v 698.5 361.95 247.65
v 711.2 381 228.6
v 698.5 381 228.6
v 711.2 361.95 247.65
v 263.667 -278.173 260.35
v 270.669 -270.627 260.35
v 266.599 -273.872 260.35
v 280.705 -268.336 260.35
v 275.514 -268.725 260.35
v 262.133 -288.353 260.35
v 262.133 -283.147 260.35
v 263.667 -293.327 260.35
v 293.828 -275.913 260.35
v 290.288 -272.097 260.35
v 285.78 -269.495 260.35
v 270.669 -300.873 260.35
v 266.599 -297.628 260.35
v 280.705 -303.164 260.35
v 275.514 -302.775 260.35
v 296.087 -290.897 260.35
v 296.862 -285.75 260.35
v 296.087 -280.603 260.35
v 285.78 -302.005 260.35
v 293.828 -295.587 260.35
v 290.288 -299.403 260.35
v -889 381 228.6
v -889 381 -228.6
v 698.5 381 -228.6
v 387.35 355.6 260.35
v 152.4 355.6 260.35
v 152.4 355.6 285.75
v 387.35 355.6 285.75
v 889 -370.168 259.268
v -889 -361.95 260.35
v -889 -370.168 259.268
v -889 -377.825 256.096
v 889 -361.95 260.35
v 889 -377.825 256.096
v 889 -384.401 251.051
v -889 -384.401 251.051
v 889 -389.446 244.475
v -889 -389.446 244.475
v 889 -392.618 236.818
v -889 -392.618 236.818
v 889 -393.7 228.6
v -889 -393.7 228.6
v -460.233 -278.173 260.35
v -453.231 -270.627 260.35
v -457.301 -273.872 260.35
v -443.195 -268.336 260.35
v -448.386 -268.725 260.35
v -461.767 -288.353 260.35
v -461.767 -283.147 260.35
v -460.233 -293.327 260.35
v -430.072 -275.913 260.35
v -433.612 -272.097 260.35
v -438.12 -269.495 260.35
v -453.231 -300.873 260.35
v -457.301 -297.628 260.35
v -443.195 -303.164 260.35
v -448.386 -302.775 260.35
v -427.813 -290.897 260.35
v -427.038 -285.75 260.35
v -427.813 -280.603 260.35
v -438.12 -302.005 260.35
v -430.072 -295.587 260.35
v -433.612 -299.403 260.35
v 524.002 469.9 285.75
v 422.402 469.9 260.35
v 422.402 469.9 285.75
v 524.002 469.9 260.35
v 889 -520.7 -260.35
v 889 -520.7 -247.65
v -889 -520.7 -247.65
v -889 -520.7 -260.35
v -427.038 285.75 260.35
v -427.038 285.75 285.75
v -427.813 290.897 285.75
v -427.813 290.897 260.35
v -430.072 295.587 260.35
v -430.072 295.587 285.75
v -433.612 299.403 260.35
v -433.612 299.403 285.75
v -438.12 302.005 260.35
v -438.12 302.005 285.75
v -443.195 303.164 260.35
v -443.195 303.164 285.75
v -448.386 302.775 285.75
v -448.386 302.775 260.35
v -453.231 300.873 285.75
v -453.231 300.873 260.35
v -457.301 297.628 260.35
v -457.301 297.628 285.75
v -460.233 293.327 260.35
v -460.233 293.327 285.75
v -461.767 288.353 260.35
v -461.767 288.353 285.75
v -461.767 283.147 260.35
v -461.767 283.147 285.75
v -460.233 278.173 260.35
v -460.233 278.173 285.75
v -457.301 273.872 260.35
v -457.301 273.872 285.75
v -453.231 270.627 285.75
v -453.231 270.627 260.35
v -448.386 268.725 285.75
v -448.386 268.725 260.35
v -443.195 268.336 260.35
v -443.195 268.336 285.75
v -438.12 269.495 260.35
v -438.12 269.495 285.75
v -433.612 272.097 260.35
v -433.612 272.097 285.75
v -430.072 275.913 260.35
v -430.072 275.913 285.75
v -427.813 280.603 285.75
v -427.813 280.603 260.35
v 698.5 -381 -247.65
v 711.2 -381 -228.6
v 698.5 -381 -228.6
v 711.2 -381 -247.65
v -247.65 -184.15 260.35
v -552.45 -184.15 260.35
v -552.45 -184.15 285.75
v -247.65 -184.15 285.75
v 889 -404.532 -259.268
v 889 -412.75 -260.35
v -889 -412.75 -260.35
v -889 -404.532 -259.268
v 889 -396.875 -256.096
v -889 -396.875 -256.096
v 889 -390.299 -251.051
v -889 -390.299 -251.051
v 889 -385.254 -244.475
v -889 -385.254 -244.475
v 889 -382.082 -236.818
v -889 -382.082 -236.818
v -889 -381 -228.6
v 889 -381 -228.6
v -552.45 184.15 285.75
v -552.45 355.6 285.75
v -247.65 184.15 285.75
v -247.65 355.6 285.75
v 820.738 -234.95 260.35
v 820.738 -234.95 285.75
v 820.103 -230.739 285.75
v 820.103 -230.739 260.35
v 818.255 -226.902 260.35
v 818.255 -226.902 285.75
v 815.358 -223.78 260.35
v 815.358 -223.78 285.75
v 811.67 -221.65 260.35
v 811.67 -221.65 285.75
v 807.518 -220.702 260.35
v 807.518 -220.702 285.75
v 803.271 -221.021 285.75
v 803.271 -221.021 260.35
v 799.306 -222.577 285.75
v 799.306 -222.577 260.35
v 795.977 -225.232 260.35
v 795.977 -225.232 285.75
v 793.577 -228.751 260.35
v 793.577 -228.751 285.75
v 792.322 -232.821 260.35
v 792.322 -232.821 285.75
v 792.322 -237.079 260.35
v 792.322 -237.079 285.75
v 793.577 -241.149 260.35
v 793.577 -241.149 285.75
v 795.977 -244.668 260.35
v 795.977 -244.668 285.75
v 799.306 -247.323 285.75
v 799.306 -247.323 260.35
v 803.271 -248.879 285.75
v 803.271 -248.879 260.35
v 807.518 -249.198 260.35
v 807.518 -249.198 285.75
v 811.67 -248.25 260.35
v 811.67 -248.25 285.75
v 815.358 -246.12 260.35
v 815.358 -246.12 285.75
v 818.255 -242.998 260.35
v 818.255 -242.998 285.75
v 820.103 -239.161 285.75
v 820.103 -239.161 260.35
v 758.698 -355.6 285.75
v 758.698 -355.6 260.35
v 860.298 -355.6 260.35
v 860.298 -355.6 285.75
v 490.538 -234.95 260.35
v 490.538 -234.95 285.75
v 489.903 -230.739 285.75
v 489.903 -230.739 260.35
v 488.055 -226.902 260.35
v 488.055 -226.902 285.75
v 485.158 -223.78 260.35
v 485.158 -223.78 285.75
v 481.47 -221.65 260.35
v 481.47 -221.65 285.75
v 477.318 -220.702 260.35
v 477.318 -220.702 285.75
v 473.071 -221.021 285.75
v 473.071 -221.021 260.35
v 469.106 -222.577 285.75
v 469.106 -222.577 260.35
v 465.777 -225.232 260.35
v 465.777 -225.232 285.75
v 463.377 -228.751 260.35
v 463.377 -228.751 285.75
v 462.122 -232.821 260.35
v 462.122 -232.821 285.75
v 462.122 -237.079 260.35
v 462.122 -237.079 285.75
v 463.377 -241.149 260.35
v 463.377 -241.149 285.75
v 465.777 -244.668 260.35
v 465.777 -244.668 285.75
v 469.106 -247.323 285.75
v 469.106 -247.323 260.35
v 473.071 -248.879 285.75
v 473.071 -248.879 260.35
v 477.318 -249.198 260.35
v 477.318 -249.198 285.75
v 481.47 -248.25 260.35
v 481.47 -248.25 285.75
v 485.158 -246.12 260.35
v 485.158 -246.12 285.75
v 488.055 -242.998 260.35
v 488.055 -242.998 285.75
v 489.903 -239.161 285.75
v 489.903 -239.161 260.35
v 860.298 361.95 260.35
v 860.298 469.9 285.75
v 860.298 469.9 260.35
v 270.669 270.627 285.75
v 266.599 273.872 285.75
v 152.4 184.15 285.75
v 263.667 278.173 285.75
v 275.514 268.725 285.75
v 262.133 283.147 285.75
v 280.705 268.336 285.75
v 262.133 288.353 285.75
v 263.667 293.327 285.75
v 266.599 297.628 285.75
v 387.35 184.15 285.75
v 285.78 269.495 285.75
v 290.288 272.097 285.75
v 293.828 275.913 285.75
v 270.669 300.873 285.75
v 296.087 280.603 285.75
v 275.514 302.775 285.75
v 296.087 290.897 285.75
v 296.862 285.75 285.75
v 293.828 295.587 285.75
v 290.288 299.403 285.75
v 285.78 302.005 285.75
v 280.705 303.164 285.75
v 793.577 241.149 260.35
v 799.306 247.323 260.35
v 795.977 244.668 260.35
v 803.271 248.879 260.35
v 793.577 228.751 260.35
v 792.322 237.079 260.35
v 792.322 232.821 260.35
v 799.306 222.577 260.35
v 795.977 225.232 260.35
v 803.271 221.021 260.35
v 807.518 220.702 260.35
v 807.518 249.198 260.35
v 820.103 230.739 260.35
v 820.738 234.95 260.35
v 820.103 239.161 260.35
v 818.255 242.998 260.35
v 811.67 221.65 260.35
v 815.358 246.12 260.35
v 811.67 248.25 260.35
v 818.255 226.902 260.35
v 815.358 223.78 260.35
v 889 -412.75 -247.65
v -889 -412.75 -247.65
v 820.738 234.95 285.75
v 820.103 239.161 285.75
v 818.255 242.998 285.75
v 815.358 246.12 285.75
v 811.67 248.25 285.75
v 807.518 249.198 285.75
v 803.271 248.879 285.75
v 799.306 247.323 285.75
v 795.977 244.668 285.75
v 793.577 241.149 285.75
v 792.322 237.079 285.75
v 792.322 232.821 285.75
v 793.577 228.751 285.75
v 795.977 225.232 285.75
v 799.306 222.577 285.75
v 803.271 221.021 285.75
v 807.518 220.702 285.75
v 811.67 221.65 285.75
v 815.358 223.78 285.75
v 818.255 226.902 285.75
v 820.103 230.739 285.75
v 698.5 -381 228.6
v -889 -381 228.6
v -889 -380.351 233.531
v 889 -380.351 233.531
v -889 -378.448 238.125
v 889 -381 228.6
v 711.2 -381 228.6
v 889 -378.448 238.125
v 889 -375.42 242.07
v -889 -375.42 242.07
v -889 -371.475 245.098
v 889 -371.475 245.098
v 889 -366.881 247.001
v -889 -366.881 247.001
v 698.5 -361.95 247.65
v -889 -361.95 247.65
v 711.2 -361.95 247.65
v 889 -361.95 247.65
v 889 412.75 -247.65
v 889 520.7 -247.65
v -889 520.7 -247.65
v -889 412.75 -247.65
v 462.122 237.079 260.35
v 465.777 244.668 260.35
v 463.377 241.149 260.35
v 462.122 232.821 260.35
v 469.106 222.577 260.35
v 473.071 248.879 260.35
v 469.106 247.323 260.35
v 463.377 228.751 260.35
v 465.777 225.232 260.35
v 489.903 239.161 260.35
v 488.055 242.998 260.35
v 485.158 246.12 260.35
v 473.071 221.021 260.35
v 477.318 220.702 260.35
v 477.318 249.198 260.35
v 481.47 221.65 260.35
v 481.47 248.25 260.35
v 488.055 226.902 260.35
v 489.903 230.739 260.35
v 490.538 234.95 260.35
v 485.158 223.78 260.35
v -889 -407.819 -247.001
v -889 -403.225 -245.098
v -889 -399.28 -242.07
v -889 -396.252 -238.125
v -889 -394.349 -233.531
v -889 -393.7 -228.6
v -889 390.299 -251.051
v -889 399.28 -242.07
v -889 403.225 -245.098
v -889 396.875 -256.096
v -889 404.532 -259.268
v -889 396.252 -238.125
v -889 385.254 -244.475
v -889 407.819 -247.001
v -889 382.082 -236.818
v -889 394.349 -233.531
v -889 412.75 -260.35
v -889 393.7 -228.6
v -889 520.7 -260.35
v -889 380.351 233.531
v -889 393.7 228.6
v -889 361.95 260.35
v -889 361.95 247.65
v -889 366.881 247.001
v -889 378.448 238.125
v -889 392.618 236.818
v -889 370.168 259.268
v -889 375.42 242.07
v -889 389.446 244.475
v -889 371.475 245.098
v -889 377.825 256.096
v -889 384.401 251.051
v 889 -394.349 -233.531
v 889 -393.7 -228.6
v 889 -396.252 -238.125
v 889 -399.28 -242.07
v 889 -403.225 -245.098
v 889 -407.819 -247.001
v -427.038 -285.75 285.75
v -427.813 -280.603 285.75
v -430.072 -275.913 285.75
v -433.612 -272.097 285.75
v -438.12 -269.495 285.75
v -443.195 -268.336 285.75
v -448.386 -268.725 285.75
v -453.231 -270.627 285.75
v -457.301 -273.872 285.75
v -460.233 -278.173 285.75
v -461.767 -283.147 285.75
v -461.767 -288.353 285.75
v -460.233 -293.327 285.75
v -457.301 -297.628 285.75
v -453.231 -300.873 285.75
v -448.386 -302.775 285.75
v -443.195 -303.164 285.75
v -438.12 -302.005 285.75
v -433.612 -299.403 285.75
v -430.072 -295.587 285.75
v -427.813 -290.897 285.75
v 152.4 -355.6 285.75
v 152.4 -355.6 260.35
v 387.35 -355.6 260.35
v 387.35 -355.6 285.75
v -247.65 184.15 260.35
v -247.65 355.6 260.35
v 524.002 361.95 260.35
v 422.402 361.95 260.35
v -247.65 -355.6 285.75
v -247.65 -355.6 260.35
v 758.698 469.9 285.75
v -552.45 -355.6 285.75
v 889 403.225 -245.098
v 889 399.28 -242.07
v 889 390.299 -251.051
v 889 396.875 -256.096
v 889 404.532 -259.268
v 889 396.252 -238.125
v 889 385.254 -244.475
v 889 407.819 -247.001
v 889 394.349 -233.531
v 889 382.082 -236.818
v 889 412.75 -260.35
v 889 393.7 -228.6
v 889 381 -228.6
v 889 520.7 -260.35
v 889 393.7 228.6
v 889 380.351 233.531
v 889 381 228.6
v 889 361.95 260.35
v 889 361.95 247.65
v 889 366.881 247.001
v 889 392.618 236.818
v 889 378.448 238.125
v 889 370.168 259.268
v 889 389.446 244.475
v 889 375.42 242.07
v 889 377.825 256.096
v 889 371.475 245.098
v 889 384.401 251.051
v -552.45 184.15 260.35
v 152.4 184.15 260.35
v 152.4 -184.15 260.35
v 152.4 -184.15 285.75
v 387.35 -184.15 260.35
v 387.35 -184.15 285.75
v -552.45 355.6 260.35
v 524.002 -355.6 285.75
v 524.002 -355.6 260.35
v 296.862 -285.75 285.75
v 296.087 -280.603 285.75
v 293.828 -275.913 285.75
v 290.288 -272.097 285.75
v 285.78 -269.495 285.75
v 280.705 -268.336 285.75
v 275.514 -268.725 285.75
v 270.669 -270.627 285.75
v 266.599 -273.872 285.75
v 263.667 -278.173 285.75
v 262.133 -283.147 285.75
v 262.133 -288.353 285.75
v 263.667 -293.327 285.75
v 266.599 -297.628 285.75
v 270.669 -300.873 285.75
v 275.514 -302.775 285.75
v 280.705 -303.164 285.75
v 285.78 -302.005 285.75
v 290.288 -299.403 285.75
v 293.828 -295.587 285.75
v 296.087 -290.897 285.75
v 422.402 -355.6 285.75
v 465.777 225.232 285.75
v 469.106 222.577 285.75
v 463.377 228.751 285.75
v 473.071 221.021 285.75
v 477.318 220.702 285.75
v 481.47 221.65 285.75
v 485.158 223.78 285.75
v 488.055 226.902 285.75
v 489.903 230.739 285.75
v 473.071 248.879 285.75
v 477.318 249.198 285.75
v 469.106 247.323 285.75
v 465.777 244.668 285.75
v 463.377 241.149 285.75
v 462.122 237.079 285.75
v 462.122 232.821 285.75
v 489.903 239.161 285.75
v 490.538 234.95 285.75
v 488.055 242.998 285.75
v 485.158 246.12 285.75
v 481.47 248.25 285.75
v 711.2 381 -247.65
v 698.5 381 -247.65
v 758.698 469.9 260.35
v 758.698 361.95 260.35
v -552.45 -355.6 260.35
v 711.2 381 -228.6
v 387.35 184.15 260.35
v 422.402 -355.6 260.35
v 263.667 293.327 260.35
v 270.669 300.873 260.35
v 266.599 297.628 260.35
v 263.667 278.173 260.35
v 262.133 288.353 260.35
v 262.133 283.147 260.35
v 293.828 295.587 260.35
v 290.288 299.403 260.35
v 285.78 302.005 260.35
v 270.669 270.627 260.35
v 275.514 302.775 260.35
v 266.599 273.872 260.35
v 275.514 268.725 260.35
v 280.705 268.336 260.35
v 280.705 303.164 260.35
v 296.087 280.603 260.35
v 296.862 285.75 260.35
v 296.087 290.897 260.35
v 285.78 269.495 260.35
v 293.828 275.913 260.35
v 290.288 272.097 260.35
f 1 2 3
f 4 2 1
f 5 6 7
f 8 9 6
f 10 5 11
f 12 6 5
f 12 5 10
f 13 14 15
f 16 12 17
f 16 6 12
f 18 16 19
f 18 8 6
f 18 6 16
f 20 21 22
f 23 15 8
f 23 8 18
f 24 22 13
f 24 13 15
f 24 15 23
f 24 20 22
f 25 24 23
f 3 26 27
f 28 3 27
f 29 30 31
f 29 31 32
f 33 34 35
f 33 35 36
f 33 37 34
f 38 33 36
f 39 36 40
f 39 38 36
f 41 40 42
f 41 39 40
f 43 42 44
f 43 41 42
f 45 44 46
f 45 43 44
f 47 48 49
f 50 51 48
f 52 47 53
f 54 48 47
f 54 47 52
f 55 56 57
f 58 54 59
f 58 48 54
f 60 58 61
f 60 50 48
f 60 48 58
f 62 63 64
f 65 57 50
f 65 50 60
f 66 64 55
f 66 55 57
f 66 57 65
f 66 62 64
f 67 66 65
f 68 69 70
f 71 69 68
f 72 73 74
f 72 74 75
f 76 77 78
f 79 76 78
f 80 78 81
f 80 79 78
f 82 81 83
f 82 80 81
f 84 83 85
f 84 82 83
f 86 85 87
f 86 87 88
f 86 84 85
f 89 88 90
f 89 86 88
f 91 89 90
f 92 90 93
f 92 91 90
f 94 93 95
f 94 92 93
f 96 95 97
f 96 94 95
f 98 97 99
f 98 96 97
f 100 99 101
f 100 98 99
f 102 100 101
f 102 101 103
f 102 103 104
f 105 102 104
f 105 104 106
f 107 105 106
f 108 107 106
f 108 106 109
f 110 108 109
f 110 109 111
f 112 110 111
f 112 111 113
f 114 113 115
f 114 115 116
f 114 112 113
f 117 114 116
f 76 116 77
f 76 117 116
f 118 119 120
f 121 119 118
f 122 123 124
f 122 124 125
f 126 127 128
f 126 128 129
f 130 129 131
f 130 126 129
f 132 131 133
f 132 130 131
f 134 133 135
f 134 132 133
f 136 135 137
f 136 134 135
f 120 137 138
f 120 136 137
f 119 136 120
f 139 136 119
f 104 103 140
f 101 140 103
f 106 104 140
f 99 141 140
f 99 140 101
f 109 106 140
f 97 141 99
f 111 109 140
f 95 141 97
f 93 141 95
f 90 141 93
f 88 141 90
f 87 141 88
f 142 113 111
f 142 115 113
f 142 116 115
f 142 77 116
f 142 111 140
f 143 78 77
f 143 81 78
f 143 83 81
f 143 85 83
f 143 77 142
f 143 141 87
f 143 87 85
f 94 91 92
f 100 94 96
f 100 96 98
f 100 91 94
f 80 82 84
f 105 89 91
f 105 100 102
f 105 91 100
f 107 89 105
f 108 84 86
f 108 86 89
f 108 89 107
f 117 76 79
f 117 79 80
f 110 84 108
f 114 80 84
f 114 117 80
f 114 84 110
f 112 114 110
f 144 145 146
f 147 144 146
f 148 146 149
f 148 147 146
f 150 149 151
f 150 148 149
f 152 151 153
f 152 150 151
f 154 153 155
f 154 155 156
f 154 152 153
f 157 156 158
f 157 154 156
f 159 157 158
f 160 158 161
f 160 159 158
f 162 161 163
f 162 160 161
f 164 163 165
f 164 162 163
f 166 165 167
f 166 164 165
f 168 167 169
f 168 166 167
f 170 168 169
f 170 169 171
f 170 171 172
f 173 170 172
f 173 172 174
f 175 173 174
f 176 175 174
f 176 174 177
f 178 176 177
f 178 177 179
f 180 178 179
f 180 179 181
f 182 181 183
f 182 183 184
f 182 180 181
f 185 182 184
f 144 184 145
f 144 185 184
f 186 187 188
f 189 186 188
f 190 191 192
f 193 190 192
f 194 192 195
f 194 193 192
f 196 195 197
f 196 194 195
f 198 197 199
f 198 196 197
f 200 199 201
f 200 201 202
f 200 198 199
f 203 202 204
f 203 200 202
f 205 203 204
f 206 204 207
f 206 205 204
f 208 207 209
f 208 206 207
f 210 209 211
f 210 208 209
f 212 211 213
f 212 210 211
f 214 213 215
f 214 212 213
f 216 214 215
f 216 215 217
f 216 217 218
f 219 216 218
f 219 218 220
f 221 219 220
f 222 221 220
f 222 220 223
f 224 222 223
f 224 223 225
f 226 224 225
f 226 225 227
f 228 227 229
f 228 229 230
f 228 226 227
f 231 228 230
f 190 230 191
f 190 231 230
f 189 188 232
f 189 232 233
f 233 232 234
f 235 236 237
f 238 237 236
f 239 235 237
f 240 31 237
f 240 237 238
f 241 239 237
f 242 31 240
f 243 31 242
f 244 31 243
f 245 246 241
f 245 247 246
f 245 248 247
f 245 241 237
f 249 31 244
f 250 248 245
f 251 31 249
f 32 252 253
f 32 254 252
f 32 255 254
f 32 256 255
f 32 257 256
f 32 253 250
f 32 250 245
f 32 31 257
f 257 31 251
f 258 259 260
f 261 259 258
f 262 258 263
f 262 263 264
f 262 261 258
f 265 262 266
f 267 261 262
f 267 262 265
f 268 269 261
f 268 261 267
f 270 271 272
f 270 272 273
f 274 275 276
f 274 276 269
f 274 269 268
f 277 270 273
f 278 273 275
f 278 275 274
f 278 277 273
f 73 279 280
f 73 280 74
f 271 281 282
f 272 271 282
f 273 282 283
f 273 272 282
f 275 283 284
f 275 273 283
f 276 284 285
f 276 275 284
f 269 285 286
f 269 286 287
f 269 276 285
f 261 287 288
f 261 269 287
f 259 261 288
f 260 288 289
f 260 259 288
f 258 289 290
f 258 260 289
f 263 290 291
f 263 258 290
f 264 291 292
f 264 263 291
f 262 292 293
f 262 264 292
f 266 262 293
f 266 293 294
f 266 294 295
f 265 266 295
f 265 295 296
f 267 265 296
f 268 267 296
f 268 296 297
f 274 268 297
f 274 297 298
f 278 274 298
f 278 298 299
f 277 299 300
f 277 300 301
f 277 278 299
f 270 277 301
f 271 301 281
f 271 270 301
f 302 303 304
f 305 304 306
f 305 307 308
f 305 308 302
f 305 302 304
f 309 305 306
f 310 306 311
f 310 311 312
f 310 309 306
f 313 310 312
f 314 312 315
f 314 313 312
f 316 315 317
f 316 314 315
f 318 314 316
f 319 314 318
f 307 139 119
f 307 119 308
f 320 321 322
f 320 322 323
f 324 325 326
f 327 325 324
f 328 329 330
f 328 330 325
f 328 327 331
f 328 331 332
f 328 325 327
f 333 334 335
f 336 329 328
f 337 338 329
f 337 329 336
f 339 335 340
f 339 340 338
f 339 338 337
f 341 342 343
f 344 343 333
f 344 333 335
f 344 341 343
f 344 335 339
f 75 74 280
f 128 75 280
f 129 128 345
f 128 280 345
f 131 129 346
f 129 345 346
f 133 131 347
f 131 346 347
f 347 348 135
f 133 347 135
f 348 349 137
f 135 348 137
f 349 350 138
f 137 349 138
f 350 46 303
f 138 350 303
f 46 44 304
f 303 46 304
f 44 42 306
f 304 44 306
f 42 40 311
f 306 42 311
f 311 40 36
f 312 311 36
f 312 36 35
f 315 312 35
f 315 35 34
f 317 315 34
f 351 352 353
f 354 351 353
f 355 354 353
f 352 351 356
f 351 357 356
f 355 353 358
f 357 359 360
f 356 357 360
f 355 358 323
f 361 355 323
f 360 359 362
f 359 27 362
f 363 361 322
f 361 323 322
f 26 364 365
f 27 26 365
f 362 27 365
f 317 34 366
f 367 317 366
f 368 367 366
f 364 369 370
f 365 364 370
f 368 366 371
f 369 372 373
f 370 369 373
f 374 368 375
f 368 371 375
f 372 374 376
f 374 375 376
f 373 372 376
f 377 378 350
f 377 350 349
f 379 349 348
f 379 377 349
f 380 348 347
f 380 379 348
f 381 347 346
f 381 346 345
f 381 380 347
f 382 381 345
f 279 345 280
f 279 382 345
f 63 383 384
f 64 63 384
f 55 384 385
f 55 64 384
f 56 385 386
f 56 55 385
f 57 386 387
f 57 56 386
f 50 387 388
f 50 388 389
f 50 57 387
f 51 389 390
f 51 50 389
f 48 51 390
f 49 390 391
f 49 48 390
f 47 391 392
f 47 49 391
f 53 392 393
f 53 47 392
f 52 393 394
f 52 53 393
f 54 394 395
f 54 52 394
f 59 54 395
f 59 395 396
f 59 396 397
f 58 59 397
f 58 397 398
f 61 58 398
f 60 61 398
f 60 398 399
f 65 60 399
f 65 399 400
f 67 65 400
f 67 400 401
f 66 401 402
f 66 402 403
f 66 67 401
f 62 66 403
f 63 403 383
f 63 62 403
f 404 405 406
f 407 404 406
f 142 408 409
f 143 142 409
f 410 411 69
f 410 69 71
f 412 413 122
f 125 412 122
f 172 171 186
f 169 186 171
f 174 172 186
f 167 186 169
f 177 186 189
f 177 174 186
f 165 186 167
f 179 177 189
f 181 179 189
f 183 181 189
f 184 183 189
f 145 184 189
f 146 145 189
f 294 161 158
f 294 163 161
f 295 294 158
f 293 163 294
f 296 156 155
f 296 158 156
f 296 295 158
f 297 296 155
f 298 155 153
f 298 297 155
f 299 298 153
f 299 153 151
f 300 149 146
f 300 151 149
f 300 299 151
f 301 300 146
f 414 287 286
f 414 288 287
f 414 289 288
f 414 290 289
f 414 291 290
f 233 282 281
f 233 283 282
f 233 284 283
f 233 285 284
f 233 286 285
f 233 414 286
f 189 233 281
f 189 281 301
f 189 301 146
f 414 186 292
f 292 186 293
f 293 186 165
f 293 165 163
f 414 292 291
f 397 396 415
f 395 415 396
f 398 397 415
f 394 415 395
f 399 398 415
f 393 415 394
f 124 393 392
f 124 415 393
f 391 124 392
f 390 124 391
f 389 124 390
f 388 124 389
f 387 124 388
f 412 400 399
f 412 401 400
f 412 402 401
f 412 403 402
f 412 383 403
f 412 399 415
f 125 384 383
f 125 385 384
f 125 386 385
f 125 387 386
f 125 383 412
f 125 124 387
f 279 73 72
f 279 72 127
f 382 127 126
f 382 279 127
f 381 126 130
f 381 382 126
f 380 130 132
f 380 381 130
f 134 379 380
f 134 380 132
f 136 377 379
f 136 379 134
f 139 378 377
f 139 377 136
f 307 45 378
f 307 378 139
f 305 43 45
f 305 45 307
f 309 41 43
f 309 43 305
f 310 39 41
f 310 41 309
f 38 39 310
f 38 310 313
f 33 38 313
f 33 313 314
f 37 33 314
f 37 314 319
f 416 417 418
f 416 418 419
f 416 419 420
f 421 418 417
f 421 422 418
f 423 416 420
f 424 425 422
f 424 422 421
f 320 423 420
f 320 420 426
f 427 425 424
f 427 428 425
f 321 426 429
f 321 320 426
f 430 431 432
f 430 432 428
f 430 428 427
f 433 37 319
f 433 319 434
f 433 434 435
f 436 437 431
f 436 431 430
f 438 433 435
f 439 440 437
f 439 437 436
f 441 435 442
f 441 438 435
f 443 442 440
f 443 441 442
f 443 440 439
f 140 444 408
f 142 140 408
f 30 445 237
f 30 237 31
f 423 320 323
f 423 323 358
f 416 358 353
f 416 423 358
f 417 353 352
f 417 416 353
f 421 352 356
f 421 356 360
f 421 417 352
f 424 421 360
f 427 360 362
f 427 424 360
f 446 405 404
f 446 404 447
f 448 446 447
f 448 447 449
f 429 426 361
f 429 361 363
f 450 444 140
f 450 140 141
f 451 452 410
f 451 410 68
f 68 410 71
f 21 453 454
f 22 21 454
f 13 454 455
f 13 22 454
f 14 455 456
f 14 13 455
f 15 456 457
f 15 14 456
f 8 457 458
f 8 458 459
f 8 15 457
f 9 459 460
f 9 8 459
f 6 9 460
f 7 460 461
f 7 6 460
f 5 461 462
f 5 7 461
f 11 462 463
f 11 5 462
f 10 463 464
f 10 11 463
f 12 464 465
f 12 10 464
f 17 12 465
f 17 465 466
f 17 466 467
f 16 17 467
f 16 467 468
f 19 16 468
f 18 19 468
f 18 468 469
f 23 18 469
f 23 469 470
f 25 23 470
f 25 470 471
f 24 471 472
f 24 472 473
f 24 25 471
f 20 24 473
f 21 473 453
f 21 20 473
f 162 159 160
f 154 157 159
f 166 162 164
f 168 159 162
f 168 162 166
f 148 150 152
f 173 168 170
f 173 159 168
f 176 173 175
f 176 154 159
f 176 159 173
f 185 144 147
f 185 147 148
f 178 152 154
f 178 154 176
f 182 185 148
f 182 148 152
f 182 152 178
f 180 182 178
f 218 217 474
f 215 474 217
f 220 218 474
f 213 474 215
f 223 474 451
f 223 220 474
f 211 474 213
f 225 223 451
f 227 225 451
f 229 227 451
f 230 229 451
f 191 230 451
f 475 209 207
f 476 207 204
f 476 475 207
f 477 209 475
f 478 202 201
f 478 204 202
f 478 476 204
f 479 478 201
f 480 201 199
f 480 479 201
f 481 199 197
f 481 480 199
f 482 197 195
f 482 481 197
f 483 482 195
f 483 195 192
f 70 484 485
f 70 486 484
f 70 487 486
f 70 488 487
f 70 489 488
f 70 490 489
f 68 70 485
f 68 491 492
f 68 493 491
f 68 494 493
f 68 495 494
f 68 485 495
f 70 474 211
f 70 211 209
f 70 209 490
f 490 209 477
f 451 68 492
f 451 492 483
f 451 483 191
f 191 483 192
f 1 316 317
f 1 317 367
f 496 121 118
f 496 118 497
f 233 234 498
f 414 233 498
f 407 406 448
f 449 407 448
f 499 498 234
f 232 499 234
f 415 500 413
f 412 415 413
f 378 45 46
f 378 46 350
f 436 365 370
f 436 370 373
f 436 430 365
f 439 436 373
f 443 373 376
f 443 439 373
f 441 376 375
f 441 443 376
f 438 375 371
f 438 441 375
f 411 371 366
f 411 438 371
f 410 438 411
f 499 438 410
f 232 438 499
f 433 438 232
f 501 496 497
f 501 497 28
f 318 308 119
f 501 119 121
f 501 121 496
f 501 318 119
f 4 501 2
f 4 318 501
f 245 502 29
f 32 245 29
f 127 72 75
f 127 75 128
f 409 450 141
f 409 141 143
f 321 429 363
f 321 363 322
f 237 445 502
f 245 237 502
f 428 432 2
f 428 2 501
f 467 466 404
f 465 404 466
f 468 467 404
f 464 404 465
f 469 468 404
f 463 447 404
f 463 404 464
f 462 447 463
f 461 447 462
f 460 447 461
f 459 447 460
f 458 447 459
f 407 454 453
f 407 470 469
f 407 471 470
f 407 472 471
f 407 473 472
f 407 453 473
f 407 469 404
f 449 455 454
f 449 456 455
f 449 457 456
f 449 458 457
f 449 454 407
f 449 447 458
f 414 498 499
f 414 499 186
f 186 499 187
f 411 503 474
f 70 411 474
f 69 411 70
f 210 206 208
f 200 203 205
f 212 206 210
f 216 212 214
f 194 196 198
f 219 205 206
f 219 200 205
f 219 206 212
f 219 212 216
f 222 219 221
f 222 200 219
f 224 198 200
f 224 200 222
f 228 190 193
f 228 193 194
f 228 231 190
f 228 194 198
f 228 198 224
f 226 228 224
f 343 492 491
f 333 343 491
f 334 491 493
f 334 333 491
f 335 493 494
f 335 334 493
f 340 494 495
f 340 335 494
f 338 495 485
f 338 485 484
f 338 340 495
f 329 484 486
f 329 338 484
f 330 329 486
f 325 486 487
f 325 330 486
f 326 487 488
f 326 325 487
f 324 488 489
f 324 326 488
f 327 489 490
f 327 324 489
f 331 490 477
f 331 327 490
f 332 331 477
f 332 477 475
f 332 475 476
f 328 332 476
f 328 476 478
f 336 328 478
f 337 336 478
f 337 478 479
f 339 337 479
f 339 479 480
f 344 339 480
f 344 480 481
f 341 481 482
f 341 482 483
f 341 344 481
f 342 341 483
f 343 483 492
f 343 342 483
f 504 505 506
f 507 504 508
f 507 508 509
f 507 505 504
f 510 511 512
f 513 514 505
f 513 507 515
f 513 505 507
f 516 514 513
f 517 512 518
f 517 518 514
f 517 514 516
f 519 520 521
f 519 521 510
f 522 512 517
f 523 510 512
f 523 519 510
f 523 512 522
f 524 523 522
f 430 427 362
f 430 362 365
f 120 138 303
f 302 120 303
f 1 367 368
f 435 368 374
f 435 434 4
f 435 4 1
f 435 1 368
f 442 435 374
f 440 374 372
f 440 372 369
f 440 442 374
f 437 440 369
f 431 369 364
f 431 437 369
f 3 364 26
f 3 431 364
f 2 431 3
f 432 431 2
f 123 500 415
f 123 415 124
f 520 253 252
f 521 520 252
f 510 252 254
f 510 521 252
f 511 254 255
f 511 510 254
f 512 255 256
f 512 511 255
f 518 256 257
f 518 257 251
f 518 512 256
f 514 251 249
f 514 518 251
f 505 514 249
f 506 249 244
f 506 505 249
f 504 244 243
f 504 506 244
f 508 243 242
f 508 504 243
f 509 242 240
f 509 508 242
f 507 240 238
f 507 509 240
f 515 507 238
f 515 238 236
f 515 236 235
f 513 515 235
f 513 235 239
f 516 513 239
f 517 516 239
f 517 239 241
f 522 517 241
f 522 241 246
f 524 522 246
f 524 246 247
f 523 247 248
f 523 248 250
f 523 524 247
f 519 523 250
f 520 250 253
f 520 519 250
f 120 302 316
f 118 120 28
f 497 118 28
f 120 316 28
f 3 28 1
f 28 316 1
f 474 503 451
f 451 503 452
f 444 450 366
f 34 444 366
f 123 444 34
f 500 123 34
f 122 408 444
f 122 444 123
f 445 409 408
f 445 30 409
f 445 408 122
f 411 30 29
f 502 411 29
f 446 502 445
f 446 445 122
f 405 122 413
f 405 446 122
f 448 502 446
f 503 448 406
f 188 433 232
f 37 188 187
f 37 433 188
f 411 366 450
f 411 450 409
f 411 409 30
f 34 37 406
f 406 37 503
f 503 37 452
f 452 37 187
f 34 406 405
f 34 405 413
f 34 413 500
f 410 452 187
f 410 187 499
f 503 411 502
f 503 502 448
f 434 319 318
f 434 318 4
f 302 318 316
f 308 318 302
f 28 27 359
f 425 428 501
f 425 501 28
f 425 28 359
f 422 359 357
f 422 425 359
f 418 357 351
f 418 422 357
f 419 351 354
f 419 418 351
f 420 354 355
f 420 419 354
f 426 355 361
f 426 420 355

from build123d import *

# Parameters (mm, degrees)
F1_DEPTH = 889
F2_W     = 234.95
F2_H     = 171.45
F2_R     = 17.4625
F2_W_2   = 304.8
F3_DEPTH = 25.4
F4_W     = 101.6
F4_H     = 825.5
F4_R     = 14.2875
F5_DEPTH = 25.4
F8_DEPTH = 12.7


with BuildPart() as f1:
    # F0 (on Right) → F1 (new body, symmetric)
    with BuildSketch(Plane.YZ):
        with BuildLine():
            Line((0, 260.35), (-361.95, 260.35))
            ThreePointArc((-361.95, 260.35), (-384.4006403027, 251.0506403027), (-393.7, 228.6))
            Line((-393.7, 228.6), (-393.7, -228.6))
            ThreePointArc((-393.7, -228.6), (-399.2796158184, -242.0703841816), (-412.75, -247.65))
            Line((-412.75, -247.65), (-520.7, -247.65))
            Line((-520.7, -247.65), (-520.7, -260.35))
            Line((-520.7, -260.35), (-412.75, -260.35))
            ThreePointArc((-412.75, -260.35), (-390.2993596973, -251.0506403027), (-381, -228.6))
            Line((-381, -228.6), (-381, 228.6))
            ThreePointArc((-381, 228.6), (-375.4203841816, 242.0703841816), (-361.95, 247.65))
            Line((-361.95, 247.65), (0, 247.65))
            Line((0, 247.65), (361.95, 247.65))
            ThreePointArc((361.95, 247.65), (375.4203841816, 242.0703841816), (381, 228.6))
            Line((381, 228.6), (381, -228.6))
            ThreePointArc((381, -228.6), (390.2993596973, -251.0506403027), (412.75, -260.35))
            Line((412.75, -260.35), (520.7, -260.35))
            Line((520.7, -260.35), (520.7, -247.65))
            Line((520.7, -247.65), (412.75, -247.65))
            ThreePointArc((412.75, -247.65), (399.2796158184, -242.0703841816), (393.7, -228.6))
            Line((393.7, -228.6), (393.7, 228.6))
            ThreePointArc((393.7, 228.6), (384.4006403027, 251.0506403027), (361.95, 260.35))
            Line((361.95, 260.35), (0, 260.35))
        make_face()
    extrude(amount=F1_DEPTH, both=True)

    # F2 (on face) → F3 (join)
    with BuildSketch(Plane.XY.offset(260.35)):
        with Locations((269.875, -269.875)):
            Rectangle(F2_W, F2_H)
        with Locations((279.4, -285.75)):
            Circle(F2_R, mode=Mode.SUBTRACT)
        with Locations((-400.05, -269.875)):
            Rectangle(F2_W_2, F2_H)
        with Locations((-444.5, -285.75)):
            Circle(F2_R, mode=Mode.SUBTRACT)
        with Locations((-400.05, 269.875)):
            Rectangle(F2_W_2, F2_H)
        with Locations((-444.5, 285.75)):
            Circle(F2_R, mode=Mode.SUBTRACT)
        with Locations((269.875, 269.875)):
            Rectangle(F2_W, F2_H)
        with Locations((279.4, 285.75)):
            Circle(F2_R, mode=Mode.SUBTRACT)
    extrude(amount=F3_DEPTH)

    # F4 (on face) → F5 (join)
    with BuildSketch(Plane.XY.offset(260.35)):
        with Locations((473.202, 57.15)):
            Rectangle(F4_W, F4_H)
        with Locations((476.25, -234.95)):
            Circle(F4_R, mode=Mode.SUBTRACT)
        with Locations((476.25, 234.95)):
            Circle(F4_R, mode=Mode.SUBTRACT)
        Polygon((758.698, -355.6), (860.298, -355.6), (860.298, 361.95), (860.298, 469.9), (758.698, 469.9), (758.698, 361.95), align=None)
        with Locations((806.45, -234.95)):
            Circle(F4_R, mode=Mode.SUBTRACT)
        with Locations((806.45, 234.95)):
            Circle(F4_R, mode=Mode.SUBTRACT)
    extrude(amount=F5_DEPTH)

    # F7 (on offset) → F8 (join)
    with BuildSketch(Plane.YZ.offset(711.2)):
        Polygon((-361.95, 247.65), (-381, 228.6), (-381, -247.65), (381, -247.65), (381, 228.6), (361.95, 247.65), align=None)
    extrude(amount=-F8_DEPTH)


solid = f1.part
